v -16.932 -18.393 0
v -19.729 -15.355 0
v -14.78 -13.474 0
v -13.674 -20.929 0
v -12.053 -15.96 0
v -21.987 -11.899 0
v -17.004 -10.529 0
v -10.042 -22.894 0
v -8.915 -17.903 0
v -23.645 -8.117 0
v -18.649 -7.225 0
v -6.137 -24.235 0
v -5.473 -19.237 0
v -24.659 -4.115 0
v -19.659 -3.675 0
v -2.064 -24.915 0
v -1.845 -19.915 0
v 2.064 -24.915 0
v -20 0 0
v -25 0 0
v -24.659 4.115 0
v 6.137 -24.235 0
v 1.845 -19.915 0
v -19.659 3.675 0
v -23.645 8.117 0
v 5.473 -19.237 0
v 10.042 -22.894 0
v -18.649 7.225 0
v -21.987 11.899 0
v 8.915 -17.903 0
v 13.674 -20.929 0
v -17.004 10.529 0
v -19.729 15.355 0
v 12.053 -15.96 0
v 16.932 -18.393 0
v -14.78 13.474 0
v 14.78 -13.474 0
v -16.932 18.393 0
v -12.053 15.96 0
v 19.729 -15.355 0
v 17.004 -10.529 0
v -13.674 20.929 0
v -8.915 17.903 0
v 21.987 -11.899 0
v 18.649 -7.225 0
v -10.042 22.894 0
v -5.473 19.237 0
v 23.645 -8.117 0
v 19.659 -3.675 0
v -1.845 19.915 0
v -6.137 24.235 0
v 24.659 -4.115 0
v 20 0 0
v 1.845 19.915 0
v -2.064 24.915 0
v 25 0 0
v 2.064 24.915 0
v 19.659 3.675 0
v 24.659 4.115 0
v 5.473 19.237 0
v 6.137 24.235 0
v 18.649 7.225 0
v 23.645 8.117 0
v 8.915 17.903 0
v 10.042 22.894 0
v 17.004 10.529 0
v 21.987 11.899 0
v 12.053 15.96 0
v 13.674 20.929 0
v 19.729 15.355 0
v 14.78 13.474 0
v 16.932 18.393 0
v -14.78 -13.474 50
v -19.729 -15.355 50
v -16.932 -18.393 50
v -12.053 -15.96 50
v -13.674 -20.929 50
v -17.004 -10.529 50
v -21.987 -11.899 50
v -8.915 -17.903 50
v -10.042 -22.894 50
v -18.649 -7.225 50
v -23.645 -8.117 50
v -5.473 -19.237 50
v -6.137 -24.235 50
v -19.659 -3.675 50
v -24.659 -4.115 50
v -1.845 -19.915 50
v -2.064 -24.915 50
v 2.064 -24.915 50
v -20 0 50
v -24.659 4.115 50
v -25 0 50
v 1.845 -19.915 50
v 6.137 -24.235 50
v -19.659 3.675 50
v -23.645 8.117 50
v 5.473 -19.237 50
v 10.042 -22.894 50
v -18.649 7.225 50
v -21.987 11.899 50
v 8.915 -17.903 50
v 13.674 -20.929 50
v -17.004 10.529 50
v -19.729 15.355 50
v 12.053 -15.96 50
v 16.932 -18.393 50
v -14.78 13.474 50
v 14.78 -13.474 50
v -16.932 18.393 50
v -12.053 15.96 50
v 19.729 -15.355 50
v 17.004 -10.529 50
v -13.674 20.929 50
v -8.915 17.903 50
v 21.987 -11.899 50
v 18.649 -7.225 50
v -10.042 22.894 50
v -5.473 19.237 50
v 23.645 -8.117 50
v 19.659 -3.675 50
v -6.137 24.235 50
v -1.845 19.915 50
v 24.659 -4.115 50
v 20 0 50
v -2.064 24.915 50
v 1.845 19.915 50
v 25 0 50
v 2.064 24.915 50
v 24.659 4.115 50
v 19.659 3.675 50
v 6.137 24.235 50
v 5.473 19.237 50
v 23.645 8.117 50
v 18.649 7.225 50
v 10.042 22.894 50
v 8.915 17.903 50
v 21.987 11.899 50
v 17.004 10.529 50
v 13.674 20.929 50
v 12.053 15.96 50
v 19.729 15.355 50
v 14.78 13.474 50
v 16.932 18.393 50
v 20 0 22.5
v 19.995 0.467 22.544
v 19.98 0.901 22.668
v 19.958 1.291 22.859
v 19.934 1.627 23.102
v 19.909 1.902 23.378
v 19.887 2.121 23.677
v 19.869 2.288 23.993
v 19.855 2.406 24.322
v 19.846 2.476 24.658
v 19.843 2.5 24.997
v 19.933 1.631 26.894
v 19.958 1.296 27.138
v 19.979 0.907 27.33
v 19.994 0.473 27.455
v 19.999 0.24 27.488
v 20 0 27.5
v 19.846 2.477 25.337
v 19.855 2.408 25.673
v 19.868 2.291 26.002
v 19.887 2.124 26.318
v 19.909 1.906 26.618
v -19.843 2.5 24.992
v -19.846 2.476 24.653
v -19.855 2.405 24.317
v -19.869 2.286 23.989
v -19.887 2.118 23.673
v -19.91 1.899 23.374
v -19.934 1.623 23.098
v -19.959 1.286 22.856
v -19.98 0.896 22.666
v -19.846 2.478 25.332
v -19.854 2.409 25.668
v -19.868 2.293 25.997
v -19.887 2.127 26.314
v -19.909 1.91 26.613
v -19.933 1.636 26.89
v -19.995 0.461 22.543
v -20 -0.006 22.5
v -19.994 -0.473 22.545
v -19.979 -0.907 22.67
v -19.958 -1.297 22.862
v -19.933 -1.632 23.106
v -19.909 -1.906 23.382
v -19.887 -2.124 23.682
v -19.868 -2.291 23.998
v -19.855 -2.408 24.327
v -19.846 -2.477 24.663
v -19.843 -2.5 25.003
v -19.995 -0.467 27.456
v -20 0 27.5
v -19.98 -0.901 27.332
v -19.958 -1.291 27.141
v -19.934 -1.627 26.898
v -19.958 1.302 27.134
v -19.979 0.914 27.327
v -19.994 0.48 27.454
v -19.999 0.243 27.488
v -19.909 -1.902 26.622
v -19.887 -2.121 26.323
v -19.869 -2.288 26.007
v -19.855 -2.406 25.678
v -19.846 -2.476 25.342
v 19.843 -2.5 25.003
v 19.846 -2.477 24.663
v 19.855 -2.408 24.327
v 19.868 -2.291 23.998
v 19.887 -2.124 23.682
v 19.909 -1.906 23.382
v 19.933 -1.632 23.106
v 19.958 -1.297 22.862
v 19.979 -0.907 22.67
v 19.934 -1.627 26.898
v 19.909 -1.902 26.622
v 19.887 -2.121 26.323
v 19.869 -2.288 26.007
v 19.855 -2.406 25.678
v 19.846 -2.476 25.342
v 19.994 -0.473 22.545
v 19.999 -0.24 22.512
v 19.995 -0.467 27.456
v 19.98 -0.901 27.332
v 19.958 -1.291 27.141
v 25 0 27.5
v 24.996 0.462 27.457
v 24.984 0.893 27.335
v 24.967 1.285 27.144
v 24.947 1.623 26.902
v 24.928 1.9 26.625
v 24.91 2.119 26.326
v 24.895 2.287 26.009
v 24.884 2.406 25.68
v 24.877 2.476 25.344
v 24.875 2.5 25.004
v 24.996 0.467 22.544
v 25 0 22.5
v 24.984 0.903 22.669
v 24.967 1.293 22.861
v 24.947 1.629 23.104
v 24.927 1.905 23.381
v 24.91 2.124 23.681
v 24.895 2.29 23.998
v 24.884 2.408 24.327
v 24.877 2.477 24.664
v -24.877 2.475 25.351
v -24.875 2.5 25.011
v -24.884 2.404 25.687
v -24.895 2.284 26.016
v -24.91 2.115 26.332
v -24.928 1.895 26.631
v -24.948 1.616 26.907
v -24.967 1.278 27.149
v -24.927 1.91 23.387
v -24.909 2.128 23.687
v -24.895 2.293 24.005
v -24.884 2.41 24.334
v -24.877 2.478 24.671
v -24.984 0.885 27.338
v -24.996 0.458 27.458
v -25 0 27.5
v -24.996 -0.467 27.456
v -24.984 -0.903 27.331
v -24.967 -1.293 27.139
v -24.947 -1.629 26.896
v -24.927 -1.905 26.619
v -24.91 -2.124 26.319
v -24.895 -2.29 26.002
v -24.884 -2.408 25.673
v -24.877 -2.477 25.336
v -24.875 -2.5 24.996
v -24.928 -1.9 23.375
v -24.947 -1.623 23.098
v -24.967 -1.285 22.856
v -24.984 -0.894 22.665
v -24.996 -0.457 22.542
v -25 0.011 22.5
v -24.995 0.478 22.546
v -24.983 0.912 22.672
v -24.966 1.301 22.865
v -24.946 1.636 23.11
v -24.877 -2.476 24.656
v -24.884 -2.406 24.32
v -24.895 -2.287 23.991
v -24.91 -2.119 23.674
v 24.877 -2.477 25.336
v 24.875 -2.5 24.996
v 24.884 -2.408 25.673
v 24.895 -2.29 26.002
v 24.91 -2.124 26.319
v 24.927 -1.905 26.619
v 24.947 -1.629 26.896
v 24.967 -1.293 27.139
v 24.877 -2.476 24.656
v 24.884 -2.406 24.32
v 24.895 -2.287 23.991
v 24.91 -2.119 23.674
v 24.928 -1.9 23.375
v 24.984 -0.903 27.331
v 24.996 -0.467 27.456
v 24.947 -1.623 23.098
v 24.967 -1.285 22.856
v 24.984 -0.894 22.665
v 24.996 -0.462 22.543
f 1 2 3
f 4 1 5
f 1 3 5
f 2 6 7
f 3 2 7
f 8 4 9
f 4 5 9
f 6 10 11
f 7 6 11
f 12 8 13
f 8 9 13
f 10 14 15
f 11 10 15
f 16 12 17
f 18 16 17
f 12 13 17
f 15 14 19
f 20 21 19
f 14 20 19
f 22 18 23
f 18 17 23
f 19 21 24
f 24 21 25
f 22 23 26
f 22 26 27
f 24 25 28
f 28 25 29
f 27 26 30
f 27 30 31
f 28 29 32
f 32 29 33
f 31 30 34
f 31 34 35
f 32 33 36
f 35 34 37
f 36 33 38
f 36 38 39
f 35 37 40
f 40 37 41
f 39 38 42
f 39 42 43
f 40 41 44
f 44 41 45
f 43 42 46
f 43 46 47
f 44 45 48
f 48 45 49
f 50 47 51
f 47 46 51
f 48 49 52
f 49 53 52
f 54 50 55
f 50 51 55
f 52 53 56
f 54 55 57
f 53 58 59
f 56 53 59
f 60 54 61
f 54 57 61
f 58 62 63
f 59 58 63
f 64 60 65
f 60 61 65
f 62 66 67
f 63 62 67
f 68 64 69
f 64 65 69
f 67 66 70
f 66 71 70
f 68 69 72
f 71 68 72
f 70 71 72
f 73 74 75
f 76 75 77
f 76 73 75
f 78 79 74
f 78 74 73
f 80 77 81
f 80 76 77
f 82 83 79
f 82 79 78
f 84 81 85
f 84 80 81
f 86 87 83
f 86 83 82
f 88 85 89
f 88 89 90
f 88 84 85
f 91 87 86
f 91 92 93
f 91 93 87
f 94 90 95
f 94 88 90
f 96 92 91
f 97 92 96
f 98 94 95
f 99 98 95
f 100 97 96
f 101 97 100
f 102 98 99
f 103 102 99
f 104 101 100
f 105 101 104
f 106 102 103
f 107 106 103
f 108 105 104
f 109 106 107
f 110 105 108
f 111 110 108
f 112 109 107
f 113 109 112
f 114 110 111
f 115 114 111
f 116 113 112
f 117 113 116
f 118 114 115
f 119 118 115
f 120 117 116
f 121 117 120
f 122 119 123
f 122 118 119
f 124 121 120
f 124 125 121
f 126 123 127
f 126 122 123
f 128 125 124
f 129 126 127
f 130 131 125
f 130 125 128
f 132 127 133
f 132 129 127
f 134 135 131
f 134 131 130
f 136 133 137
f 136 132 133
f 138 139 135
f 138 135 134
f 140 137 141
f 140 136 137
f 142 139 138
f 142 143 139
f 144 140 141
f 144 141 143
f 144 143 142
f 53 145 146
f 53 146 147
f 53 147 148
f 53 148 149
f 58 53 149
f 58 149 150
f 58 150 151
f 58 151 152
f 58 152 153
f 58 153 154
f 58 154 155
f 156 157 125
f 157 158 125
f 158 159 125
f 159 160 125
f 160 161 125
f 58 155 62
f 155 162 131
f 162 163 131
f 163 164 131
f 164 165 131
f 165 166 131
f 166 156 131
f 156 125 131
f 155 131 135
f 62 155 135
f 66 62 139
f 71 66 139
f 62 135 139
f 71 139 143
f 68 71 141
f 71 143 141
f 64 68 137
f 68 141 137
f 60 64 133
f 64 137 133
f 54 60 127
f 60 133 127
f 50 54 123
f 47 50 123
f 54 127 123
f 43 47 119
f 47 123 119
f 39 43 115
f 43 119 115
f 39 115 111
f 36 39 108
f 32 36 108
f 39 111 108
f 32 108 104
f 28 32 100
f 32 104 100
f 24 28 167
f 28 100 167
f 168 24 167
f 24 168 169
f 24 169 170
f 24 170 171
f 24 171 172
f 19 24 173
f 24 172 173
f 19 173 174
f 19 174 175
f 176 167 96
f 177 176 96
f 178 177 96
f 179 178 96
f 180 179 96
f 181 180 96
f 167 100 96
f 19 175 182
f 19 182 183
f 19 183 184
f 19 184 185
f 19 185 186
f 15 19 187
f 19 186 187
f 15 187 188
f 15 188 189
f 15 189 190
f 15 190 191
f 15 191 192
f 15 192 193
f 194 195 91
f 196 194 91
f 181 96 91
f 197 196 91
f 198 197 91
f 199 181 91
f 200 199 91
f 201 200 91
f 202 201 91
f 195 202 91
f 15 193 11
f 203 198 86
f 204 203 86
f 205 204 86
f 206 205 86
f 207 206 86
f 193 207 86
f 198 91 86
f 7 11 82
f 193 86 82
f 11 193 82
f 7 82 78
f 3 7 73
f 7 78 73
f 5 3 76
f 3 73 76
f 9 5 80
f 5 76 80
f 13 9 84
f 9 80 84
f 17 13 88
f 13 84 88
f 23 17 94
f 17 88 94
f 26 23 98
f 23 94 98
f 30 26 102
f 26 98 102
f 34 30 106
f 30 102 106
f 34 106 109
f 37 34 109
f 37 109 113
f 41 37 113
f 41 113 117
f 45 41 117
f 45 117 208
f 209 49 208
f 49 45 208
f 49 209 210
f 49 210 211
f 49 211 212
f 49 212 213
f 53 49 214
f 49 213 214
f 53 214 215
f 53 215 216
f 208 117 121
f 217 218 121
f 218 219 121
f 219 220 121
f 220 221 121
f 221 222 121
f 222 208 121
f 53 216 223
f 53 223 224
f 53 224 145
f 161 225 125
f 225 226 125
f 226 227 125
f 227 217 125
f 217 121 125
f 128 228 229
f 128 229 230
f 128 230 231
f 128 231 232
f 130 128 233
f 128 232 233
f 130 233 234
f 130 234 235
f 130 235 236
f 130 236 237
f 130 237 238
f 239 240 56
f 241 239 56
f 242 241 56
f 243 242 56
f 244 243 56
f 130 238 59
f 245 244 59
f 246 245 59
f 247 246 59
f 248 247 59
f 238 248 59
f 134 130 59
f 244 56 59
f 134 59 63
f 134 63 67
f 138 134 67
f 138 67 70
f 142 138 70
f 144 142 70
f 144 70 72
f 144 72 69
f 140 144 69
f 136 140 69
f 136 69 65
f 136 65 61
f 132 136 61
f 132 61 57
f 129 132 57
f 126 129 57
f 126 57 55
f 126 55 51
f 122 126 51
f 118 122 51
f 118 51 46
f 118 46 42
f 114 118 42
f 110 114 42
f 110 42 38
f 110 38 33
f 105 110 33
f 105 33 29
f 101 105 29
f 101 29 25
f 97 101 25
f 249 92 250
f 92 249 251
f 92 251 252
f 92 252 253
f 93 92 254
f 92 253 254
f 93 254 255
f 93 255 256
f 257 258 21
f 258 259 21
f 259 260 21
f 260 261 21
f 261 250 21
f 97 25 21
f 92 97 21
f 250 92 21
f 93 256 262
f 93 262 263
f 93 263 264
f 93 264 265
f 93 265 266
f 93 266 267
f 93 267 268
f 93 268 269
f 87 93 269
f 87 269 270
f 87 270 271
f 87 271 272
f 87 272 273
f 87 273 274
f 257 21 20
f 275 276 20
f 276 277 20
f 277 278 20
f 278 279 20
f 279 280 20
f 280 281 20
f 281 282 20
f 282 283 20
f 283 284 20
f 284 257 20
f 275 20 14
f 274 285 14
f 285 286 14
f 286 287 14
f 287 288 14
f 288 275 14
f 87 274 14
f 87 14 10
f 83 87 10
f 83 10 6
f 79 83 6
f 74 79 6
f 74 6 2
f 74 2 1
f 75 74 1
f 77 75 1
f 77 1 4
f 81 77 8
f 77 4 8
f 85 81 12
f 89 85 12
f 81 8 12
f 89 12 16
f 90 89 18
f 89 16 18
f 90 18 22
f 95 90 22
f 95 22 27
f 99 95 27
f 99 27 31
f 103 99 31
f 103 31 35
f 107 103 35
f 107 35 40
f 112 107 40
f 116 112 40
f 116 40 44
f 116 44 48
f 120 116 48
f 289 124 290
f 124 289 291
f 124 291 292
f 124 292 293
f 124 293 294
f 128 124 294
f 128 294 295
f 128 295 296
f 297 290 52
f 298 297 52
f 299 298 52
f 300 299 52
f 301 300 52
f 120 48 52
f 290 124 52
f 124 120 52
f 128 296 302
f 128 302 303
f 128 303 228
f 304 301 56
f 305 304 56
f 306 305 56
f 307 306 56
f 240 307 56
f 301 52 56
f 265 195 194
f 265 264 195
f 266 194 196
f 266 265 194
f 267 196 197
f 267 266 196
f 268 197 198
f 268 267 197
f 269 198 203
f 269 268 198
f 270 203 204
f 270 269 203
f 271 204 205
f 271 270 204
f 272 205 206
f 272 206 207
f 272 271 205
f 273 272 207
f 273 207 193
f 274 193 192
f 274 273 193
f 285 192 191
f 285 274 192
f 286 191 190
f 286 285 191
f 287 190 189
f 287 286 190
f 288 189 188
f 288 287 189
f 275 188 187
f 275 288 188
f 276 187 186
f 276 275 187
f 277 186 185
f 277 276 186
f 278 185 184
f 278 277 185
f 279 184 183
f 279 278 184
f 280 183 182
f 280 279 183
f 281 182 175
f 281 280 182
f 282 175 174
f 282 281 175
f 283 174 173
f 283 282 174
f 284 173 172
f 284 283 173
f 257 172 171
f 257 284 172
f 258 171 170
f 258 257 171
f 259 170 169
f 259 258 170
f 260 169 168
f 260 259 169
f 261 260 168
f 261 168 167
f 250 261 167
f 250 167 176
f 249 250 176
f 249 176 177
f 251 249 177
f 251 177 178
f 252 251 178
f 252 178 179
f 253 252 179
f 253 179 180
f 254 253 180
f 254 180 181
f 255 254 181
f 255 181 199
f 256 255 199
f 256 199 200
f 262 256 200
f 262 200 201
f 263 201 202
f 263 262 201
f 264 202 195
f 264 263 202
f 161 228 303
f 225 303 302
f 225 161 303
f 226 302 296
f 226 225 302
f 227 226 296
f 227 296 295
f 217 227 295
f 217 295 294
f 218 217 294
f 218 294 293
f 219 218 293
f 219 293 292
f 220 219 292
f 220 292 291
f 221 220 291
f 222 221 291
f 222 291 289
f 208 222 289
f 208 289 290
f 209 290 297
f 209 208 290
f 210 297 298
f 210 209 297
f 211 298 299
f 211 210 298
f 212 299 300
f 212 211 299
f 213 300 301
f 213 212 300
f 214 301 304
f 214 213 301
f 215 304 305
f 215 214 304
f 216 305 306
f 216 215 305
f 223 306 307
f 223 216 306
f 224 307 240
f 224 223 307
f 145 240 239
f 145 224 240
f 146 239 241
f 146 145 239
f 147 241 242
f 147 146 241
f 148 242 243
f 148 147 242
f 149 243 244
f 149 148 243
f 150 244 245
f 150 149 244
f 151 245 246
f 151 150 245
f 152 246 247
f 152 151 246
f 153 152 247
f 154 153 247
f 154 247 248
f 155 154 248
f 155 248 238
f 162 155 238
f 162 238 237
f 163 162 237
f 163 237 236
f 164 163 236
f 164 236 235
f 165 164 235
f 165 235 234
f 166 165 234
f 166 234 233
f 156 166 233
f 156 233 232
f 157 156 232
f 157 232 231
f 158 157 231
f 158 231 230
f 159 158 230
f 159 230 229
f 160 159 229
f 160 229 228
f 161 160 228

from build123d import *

# Parameters (mm, degrees)
SKETCH1_R               = 25
BOSS_EXTRUDE1_DEPTH     = 50
SKETCH2_R               = 20
CUT_EXTRUDE1_DEPTH      = 50
CUT_EXTRUDE2_DEPTH      = 50
CUT_EXTRUDE2_DEPTH_BACK = 50
SKETCH3_R               = 2.5


with BuildPart() as part:
    # Sketch1 → Boss-Extrude1 (new body)
    with BuildSketch(Plane.XY):
        Circle(SKETCH1_R)
    extrude(amount=BOSS_EXTRUDE1_DEPTH)

    # Sketch2 → Cut-Extrude1 (cut)
    with BuildSketch(Plane.XY.offset(50)):
        Circle(SKETCH2_R)
    extrude(amount=-CUT_EXTRUDE1_DEPTH, mode=Mode.SUBTRACT)

    # Sketch3 → Cut-Extrude2 (cut, two sides: drawn at the far end of the back side and taken through both)
    with BuildSketch(Plane(origin=(0, 0, 0), x_dir=(0, 0, -1), z_dir=(1, 0, 0)).offset(-CUT_EXTRUDE2_DEPTH_BACK)):
        with Locations((-25, 0)):
            Circle(SKETCH3_R)
    extrude(amount=CUT_EXTRUDE2_DEPTH + CUT_EXTRUDE2_DEPTH_BACK, mode=Mode.SUBTRACT)


solid = part.part
